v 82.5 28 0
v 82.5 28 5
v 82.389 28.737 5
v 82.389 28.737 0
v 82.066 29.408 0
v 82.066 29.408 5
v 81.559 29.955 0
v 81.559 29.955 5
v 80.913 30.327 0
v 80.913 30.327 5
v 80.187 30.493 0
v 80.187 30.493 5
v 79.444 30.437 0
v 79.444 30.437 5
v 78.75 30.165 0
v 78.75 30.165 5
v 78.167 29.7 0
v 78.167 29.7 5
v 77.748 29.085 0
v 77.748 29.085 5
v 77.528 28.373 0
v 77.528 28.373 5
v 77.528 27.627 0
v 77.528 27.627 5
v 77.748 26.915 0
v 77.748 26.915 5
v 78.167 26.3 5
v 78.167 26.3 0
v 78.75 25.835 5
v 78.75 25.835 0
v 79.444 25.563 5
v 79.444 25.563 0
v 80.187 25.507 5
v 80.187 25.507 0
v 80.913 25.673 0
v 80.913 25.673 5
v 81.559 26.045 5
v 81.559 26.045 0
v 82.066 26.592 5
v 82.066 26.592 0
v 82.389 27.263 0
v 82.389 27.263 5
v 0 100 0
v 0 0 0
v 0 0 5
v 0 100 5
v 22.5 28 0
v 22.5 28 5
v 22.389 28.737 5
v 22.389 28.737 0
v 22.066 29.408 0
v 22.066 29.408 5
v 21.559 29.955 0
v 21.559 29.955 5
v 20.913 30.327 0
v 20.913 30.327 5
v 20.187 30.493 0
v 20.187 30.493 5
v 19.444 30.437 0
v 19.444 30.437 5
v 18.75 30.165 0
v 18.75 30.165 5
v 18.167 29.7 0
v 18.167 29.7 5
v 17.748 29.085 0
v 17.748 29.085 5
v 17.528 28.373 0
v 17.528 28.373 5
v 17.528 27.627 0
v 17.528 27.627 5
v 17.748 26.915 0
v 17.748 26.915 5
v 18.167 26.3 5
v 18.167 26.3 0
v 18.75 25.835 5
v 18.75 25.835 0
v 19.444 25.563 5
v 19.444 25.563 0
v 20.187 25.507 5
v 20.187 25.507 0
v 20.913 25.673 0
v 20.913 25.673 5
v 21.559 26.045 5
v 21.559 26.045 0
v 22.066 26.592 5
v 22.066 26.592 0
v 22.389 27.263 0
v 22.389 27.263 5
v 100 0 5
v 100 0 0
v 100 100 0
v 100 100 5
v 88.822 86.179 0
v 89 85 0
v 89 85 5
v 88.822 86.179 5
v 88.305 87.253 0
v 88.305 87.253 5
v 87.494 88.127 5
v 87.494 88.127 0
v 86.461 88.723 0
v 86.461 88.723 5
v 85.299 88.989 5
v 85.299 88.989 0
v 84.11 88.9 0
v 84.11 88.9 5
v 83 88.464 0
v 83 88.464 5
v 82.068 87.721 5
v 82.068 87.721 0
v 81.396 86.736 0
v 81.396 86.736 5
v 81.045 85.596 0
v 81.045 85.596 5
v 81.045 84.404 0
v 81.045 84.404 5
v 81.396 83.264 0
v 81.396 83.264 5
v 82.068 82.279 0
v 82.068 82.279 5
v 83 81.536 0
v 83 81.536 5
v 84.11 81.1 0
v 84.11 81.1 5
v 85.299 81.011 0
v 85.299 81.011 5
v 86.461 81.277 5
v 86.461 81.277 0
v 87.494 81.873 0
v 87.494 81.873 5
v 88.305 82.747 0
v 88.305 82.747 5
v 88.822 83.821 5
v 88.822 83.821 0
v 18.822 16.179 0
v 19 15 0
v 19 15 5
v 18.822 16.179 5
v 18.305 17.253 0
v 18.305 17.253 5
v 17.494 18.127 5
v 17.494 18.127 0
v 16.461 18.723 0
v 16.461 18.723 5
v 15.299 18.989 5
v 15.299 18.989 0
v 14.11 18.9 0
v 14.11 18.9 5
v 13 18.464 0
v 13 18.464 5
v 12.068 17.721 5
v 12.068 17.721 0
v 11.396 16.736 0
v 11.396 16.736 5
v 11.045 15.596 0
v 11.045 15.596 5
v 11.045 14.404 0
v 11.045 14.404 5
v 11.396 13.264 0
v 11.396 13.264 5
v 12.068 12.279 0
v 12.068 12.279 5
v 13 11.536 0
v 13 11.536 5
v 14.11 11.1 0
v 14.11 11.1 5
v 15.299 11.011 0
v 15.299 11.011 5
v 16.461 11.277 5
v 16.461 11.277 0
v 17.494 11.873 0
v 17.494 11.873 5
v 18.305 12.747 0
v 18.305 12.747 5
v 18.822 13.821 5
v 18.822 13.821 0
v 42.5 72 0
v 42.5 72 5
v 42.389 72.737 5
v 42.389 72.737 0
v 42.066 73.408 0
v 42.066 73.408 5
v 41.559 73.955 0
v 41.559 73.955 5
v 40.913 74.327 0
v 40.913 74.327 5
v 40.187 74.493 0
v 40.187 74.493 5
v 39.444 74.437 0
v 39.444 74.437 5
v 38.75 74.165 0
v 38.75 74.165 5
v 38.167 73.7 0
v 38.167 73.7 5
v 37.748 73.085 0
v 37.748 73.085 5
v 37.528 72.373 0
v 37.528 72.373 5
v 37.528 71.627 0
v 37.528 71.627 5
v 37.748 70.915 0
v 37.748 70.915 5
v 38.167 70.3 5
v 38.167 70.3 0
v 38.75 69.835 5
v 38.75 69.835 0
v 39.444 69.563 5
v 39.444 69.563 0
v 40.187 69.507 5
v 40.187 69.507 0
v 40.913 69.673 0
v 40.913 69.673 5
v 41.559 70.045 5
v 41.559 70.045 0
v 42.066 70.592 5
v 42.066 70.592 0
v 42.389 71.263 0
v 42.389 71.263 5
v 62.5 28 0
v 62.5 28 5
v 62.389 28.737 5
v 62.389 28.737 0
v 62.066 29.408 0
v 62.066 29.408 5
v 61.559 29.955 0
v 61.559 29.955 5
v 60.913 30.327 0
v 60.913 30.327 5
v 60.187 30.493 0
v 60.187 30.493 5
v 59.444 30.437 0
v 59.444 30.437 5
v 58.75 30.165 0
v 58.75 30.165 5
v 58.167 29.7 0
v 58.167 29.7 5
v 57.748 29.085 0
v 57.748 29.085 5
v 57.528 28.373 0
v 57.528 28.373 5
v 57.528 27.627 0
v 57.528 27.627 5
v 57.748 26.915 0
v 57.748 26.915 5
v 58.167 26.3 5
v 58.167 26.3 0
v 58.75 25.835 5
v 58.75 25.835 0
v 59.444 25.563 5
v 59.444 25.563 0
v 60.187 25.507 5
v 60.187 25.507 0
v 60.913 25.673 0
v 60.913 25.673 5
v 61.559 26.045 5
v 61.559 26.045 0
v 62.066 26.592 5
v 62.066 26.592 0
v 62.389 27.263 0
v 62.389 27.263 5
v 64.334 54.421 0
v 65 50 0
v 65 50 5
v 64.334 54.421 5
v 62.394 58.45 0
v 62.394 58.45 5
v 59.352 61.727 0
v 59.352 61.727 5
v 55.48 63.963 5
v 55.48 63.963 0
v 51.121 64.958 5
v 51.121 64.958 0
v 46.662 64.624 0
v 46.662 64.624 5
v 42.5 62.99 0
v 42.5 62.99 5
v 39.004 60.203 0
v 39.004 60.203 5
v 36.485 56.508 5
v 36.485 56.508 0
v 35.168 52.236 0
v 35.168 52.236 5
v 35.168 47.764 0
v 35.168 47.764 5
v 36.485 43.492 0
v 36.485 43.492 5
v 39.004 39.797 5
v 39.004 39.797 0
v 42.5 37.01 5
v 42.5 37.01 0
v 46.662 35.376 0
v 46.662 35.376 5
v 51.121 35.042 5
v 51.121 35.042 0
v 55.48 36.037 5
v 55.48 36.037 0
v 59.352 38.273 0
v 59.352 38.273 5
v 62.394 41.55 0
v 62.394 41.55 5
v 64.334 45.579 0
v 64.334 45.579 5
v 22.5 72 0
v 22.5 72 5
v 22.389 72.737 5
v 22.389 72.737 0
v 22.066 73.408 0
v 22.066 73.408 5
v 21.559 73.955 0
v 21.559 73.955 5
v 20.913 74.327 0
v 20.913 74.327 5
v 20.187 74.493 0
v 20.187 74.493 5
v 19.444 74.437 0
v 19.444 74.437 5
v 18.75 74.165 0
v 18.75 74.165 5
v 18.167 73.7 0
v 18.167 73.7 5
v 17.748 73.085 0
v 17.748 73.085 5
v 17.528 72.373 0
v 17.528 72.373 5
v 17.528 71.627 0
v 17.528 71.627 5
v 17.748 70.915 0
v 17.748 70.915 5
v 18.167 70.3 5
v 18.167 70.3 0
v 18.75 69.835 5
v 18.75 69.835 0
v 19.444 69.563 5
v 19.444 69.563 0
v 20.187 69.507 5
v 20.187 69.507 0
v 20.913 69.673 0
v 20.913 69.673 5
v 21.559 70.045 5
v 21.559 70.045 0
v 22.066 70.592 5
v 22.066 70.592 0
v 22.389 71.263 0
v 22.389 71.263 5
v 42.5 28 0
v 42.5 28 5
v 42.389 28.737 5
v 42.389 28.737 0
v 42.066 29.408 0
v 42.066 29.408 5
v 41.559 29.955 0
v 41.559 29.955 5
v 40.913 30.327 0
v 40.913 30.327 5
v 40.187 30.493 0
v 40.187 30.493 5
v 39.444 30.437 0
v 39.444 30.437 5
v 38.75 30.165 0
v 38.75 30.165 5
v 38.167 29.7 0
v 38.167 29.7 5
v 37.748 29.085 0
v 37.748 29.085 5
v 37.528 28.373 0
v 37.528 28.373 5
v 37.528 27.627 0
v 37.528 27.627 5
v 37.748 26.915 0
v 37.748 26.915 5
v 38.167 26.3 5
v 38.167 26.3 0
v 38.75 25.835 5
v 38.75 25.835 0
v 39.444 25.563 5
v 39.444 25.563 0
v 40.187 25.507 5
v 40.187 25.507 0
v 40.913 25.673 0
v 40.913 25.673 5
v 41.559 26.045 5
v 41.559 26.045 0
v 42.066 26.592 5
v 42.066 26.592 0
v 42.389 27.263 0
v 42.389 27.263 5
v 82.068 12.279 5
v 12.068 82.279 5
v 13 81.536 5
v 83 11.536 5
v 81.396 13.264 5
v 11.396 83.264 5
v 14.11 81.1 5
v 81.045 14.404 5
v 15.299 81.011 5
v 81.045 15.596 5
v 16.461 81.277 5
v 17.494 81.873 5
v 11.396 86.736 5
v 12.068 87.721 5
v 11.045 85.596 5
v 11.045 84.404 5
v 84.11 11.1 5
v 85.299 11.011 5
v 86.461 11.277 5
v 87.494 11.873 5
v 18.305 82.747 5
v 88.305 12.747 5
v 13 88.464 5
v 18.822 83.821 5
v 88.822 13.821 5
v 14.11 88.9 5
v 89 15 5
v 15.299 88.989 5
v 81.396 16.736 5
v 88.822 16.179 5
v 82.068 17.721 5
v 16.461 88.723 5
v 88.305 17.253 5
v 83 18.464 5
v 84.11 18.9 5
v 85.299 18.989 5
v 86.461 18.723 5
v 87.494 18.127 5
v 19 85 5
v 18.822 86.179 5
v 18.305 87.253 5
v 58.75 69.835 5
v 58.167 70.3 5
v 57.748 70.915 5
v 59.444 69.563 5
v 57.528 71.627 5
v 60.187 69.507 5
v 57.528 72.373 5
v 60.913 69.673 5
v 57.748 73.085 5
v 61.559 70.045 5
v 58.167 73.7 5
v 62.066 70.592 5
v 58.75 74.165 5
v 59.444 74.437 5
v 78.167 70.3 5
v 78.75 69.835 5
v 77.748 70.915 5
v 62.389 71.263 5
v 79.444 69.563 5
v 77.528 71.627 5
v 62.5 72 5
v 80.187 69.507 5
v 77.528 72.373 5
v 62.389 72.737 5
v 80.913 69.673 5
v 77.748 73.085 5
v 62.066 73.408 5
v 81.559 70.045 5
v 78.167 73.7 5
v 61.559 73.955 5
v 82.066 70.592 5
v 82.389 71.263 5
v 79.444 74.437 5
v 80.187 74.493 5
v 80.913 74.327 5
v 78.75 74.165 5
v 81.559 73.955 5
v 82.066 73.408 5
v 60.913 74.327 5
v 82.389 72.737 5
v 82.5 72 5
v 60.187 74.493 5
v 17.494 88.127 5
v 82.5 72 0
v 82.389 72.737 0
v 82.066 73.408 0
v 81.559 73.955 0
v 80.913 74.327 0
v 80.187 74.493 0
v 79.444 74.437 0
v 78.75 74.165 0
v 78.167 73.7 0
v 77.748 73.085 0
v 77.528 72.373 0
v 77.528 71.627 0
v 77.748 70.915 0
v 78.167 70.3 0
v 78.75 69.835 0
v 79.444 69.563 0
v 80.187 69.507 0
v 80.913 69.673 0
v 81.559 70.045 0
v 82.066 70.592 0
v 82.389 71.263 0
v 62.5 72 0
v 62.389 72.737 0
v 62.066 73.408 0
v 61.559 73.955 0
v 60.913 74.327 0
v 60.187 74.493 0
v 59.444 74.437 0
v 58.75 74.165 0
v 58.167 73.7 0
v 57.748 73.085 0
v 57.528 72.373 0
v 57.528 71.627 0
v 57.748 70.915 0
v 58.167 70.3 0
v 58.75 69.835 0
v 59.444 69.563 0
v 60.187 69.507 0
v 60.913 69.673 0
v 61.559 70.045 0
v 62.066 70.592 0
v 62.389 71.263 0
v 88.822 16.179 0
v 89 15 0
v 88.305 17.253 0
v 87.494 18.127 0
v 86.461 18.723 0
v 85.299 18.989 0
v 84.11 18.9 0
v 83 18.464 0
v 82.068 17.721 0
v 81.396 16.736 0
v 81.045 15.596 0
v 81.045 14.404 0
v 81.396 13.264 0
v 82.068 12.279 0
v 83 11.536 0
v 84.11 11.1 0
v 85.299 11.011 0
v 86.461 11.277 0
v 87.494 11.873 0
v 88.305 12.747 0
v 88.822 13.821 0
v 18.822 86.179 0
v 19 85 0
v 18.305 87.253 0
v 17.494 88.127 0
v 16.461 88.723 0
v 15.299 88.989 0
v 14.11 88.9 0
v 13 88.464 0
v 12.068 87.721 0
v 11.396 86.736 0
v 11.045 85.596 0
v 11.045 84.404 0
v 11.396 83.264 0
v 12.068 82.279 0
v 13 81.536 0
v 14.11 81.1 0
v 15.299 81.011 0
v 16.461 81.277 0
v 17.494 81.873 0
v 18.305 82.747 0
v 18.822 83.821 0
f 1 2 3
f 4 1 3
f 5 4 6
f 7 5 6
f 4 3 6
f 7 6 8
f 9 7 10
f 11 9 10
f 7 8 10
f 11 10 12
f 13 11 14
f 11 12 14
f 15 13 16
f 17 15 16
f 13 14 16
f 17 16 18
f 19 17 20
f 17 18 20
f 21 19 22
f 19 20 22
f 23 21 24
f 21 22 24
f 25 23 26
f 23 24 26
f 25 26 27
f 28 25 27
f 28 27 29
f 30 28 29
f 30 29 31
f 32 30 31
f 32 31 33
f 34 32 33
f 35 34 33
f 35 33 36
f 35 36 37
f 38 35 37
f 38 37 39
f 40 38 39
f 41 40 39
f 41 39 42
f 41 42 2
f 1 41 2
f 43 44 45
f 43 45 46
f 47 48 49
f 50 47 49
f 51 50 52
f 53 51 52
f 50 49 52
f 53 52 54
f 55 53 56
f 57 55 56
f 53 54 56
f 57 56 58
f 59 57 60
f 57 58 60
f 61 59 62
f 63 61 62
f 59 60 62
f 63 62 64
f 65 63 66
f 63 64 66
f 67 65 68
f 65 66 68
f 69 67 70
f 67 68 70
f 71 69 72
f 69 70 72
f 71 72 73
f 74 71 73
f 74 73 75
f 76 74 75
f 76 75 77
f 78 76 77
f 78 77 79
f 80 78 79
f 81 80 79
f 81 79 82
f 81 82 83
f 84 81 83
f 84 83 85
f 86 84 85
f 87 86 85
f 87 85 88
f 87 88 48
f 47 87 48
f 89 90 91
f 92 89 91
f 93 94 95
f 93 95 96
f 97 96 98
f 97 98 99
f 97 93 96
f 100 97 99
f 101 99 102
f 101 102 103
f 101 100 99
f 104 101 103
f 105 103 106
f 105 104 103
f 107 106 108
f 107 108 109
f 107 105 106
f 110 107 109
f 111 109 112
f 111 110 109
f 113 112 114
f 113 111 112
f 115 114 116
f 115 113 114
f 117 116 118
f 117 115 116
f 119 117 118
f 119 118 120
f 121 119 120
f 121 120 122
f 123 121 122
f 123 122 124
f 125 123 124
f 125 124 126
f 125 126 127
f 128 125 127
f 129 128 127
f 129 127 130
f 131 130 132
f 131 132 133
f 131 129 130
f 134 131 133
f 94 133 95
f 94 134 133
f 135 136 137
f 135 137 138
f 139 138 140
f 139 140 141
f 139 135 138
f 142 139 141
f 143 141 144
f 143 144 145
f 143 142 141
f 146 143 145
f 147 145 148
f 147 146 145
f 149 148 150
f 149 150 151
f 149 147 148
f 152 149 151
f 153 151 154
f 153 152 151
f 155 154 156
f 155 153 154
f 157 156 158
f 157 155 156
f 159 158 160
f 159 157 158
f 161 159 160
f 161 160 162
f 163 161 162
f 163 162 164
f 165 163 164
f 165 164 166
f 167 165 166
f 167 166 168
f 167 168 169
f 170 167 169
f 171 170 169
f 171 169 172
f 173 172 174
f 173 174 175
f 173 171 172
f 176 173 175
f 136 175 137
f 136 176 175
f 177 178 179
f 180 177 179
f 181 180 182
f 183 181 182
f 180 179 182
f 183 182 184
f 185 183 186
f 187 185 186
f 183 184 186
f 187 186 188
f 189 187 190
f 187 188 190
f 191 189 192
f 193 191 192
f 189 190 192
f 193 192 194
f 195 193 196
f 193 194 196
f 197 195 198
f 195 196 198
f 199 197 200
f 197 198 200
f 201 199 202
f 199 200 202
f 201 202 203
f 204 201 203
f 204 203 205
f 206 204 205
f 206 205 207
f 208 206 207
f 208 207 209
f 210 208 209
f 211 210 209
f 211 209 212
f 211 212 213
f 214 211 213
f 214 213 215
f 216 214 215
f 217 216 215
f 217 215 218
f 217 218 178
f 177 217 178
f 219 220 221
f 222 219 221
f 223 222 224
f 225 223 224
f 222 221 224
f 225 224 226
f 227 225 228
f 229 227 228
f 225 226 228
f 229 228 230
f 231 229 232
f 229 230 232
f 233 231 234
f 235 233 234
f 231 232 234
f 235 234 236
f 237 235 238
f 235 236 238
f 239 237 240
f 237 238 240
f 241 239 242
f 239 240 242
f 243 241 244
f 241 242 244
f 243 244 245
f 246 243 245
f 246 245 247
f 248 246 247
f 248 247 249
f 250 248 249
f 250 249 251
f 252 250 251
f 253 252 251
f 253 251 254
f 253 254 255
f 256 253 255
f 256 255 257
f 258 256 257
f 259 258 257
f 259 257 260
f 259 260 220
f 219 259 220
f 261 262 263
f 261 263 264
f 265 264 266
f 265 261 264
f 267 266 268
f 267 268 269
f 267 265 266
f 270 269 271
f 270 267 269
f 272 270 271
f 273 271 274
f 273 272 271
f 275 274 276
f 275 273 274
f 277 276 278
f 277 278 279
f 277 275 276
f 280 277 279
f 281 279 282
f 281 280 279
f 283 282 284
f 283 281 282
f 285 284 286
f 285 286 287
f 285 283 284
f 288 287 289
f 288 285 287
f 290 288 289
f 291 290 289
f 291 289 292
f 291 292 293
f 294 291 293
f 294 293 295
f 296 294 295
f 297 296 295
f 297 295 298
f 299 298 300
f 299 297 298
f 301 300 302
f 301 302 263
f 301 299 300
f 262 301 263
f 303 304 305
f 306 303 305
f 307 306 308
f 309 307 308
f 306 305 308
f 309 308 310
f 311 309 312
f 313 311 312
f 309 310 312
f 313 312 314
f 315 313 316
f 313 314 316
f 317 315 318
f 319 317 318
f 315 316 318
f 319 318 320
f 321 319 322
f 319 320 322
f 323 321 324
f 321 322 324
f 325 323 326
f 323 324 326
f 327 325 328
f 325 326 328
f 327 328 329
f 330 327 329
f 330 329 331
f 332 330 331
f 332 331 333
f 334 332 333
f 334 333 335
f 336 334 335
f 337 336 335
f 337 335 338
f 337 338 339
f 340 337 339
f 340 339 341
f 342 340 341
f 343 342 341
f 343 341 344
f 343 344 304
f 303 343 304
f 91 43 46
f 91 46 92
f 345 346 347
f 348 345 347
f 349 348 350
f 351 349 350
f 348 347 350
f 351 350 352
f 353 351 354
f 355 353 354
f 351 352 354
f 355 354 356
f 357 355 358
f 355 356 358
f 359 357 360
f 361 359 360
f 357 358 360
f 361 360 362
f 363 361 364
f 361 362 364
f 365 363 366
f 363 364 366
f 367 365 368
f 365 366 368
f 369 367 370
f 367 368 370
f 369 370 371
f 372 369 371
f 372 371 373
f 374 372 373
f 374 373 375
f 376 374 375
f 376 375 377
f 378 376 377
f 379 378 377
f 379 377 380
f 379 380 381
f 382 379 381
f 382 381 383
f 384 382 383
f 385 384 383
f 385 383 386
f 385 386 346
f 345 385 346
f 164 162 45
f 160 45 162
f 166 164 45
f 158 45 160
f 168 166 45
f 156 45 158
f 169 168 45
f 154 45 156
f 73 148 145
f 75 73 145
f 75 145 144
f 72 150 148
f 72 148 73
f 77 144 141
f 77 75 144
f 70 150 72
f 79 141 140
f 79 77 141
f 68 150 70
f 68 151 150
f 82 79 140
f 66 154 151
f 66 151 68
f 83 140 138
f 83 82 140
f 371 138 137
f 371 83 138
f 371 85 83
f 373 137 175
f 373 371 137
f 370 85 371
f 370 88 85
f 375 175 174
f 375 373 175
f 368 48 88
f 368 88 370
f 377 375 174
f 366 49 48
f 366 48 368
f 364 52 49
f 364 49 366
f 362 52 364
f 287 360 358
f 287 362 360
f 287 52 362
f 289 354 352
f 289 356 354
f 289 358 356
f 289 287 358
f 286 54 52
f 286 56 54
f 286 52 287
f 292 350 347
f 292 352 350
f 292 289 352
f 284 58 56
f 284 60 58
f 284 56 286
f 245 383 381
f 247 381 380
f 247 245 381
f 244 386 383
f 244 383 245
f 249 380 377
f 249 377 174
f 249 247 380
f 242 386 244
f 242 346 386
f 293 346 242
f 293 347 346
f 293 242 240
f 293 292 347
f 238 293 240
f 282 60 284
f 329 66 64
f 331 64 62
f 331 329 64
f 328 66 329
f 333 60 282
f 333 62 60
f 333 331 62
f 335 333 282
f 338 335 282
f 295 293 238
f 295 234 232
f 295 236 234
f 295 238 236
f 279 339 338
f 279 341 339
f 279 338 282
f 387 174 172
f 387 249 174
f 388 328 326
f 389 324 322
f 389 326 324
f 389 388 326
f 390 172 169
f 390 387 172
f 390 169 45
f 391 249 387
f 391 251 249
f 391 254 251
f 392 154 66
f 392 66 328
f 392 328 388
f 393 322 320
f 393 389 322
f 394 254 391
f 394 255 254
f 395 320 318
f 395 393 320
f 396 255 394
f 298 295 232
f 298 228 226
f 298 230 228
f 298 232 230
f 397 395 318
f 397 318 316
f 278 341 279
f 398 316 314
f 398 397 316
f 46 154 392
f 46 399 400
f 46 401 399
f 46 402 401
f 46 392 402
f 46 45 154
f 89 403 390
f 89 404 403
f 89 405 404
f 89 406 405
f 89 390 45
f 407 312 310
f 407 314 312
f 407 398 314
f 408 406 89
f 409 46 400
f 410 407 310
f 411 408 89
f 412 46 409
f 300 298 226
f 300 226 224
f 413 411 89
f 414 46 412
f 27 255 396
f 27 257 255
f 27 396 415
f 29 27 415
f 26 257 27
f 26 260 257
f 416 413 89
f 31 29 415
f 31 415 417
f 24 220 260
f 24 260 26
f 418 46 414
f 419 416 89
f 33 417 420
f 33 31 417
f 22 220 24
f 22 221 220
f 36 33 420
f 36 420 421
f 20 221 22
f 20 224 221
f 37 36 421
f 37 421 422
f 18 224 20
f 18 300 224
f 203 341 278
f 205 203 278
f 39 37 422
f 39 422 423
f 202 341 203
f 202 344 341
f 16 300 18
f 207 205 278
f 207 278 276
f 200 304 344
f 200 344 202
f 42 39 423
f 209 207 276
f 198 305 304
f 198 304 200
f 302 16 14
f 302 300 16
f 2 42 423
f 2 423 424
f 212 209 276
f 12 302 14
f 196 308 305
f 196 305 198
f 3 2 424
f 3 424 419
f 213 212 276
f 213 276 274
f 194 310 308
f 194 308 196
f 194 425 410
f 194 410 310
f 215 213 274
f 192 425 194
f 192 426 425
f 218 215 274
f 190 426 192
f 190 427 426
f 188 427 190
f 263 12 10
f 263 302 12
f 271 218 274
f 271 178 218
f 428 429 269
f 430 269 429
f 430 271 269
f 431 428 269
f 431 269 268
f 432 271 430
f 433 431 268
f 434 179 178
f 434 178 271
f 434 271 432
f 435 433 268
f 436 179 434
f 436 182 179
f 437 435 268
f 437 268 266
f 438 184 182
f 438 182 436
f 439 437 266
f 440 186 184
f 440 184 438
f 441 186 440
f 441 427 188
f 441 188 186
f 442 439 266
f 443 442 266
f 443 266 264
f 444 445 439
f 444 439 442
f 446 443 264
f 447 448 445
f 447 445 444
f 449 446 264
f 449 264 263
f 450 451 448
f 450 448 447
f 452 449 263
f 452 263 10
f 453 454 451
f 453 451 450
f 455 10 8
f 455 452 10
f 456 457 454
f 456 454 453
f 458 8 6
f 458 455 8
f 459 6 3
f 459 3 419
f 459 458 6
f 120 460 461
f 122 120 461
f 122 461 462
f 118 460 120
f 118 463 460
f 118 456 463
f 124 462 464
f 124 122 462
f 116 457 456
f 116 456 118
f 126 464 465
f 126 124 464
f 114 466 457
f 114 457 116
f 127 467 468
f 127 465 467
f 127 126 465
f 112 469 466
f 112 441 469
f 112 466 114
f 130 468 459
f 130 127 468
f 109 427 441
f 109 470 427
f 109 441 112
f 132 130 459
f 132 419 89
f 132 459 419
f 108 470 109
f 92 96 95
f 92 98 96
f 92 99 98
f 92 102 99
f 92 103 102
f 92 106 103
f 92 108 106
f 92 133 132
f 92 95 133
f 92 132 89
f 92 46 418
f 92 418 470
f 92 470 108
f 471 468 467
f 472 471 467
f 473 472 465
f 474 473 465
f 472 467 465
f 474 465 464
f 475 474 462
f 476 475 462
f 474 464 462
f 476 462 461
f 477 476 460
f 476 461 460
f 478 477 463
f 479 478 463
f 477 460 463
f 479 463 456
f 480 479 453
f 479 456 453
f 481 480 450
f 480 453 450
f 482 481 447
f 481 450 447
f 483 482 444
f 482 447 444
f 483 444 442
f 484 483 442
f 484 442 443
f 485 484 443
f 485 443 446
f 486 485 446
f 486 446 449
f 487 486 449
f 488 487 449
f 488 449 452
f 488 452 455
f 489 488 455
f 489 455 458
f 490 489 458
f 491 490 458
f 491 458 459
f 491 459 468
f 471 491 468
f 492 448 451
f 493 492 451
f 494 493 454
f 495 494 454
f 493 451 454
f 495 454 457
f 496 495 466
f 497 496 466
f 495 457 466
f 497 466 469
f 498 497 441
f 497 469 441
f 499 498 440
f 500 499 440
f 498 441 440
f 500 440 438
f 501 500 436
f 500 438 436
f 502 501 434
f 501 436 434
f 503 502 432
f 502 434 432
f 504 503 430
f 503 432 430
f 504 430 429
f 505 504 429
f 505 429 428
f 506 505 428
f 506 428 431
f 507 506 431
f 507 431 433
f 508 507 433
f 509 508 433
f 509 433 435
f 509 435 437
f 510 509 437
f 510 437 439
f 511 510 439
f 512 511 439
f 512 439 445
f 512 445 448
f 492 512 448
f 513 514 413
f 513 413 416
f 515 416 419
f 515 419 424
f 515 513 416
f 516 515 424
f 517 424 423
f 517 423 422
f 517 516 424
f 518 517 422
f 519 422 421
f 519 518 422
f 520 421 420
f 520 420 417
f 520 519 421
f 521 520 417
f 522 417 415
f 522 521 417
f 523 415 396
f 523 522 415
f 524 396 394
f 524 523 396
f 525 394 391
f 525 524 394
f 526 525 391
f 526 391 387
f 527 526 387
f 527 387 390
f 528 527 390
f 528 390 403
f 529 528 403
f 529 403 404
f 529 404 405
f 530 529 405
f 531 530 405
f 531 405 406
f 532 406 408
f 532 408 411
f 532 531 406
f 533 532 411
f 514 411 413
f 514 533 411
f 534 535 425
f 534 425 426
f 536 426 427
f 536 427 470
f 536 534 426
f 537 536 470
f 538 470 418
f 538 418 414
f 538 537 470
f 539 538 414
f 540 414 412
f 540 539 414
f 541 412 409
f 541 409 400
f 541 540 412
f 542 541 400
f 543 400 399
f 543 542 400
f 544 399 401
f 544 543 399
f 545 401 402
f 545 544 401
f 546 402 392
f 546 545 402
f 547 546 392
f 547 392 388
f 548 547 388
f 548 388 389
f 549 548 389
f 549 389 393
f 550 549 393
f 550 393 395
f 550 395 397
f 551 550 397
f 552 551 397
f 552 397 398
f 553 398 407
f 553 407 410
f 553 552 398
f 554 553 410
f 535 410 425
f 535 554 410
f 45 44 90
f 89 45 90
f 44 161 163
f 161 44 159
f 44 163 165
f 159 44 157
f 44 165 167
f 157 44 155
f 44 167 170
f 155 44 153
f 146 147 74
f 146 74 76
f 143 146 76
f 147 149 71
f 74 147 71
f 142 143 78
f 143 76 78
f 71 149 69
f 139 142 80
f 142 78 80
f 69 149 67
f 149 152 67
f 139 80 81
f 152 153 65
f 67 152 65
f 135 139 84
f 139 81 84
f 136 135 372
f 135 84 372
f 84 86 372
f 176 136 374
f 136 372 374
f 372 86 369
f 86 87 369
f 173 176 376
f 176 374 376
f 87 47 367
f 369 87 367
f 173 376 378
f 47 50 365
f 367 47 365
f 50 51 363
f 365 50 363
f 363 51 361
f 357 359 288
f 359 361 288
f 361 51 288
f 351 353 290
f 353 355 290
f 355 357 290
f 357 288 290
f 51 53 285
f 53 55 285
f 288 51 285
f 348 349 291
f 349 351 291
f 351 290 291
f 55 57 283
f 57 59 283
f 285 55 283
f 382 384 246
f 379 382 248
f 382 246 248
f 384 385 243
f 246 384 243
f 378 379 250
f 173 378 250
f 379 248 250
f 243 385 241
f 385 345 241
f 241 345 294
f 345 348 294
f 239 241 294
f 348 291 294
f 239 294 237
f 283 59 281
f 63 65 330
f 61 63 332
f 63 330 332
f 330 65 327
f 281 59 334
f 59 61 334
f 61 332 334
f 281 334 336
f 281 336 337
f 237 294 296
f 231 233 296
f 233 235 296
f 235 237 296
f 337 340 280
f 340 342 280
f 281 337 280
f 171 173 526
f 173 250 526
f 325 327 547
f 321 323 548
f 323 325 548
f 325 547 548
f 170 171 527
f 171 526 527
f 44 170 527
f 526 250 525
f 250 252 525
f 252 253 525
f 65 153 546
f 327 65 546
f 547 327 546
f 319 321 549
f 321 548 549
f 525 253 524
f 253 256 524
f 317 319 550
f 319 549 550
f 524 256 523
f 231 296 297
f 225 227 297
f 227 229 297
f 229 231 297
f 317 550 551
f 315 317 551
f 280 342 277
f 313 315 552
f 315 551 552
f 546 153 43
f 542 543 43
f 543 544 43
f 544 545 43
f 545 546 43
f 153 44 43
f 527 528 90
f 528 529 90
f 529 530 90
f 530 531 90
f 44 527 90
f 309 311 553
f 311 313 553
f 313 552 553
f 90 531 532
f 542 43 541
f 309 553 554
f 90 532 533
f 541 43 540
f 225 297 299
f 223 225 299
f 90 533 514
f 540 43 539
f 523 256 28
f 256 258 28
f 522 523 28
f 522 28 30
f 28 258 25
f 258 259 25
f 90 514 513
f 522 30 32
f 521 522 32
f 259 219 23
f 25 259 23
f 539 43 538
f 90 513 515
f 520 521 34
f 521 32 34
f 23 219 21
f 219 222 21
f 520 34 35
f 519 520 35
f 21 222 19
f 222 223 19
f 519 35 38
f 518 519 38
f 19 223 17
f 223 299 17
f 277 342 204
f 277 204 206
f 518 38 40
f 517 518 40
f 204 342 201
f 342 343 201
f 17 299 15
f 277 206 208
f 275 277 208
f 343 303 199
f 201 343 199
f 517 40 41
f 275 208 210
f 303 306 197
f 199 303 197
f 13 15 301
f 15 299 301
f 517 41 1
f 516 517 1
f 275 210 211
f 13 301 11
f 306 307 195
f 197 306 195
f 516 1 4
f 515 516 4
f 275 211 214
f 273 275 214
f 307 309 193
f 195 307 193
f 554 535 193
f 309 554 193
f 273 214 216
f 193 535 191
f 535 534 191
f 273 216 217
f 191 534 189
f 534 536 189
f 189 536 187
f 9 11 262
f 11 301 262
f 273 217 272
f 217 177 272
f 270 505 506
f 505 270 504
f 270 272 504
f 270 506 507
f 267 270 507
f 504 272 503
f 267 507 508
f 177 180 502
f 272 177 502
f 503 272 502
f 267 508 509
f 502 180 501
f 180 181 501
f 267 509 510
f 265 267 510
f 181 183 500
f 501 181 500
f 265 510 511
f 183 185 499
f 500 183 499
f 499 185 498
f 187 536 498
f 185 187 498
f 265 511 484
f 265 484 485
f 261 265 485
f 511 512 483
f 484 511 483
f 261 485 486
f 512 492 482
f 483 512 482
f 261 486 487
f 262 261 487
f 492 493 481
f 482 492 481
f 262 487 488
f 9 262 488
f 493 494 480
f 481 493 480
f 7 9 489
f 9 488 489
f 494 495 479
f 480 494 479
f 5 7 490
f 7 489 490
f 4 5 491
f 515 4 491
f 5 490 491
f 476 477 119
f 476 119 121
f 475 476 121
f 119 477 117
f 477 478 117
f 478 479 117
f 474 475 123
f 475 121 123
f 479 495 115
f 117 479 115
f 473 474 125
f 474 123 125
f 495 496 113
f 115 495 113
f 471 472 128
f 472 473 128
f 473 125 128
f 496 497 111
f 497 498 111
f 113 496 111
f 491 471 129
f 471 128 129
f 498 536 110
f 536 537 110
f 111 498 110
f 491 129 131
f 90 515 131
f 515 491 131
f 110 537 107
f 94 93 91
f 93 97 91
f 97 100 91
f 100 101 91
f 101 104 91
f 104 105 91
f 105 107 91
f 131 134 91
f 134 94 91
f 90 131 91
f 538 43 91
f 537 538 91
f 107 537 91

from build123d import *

# Parameters (mm, degrees)
SKETCH1_W           = 100
SKETCH1_H           = 100
SKETCH1_R           = 4
SKETCH1_R_2         = 15
BOSS_EXTRUDE1_DEPTH = 5
SKETCH2_R           = 2.5
CUT_EXTRUDE1_DEPTH  = 10


with BuildPart() as part:
    # Sketch1 → Boss-Extrude1 (new body)
    with BuildSketch(Plane.XY):
        with Locations((50, 50)):
            Rectangle(SKETCH1_W, SKETCH1_H)
        with Locations((15, 85)):
            Circle(SKETCH1_R, mode=Mode.SUBTRACT)
        with Locations((85, 85)):
            Circle(SKETCH1_R, mode=Mode.SUBTRACT)
        with Locations((85, 15)):
            Circle(SKETCH1_R, mode=Mode.SUBTRACT)
        with Locations((15, 15)):
            Circle(SKETCH1_R, mode=Mode.SUBTRACT)
        with Locations((50, 50)):
            Circle(SKETCH1_R_2, mode=Mode.SUBTRACT)
    extrude(amount=BOSS_EXTRUDE1_DEPTH)

    # Sketch2 → Cut-Extrude1 (cut)
    with BuildSketch(Plane.XY.offset(5)):
        with Locations((20, 72)):
            Circle(SKETCH2_R)
        with Locations((40, 72)):
            Circle(SKETCH2_R)
        with Locations((60, 72)):
            Circle(SKETCH2_R)
        with Locations((80, 72)):
            Circle(SKETCH2_R)
        with Locations((80, 28)):
            Circle(SKETCH2_R)
        with Locations((60, 28)):
            Circle(SKETCH2_R)
        with Locations((40, 28)):
            Circle(SKETCH2_R)
        with Locations((20, 28)):
            Circle(SKETCH2_R)
    extrude(amount=-CUT_EXTRUDE1_DEPTH, mode=Mode.SUBTRACT)


solid = part.part
